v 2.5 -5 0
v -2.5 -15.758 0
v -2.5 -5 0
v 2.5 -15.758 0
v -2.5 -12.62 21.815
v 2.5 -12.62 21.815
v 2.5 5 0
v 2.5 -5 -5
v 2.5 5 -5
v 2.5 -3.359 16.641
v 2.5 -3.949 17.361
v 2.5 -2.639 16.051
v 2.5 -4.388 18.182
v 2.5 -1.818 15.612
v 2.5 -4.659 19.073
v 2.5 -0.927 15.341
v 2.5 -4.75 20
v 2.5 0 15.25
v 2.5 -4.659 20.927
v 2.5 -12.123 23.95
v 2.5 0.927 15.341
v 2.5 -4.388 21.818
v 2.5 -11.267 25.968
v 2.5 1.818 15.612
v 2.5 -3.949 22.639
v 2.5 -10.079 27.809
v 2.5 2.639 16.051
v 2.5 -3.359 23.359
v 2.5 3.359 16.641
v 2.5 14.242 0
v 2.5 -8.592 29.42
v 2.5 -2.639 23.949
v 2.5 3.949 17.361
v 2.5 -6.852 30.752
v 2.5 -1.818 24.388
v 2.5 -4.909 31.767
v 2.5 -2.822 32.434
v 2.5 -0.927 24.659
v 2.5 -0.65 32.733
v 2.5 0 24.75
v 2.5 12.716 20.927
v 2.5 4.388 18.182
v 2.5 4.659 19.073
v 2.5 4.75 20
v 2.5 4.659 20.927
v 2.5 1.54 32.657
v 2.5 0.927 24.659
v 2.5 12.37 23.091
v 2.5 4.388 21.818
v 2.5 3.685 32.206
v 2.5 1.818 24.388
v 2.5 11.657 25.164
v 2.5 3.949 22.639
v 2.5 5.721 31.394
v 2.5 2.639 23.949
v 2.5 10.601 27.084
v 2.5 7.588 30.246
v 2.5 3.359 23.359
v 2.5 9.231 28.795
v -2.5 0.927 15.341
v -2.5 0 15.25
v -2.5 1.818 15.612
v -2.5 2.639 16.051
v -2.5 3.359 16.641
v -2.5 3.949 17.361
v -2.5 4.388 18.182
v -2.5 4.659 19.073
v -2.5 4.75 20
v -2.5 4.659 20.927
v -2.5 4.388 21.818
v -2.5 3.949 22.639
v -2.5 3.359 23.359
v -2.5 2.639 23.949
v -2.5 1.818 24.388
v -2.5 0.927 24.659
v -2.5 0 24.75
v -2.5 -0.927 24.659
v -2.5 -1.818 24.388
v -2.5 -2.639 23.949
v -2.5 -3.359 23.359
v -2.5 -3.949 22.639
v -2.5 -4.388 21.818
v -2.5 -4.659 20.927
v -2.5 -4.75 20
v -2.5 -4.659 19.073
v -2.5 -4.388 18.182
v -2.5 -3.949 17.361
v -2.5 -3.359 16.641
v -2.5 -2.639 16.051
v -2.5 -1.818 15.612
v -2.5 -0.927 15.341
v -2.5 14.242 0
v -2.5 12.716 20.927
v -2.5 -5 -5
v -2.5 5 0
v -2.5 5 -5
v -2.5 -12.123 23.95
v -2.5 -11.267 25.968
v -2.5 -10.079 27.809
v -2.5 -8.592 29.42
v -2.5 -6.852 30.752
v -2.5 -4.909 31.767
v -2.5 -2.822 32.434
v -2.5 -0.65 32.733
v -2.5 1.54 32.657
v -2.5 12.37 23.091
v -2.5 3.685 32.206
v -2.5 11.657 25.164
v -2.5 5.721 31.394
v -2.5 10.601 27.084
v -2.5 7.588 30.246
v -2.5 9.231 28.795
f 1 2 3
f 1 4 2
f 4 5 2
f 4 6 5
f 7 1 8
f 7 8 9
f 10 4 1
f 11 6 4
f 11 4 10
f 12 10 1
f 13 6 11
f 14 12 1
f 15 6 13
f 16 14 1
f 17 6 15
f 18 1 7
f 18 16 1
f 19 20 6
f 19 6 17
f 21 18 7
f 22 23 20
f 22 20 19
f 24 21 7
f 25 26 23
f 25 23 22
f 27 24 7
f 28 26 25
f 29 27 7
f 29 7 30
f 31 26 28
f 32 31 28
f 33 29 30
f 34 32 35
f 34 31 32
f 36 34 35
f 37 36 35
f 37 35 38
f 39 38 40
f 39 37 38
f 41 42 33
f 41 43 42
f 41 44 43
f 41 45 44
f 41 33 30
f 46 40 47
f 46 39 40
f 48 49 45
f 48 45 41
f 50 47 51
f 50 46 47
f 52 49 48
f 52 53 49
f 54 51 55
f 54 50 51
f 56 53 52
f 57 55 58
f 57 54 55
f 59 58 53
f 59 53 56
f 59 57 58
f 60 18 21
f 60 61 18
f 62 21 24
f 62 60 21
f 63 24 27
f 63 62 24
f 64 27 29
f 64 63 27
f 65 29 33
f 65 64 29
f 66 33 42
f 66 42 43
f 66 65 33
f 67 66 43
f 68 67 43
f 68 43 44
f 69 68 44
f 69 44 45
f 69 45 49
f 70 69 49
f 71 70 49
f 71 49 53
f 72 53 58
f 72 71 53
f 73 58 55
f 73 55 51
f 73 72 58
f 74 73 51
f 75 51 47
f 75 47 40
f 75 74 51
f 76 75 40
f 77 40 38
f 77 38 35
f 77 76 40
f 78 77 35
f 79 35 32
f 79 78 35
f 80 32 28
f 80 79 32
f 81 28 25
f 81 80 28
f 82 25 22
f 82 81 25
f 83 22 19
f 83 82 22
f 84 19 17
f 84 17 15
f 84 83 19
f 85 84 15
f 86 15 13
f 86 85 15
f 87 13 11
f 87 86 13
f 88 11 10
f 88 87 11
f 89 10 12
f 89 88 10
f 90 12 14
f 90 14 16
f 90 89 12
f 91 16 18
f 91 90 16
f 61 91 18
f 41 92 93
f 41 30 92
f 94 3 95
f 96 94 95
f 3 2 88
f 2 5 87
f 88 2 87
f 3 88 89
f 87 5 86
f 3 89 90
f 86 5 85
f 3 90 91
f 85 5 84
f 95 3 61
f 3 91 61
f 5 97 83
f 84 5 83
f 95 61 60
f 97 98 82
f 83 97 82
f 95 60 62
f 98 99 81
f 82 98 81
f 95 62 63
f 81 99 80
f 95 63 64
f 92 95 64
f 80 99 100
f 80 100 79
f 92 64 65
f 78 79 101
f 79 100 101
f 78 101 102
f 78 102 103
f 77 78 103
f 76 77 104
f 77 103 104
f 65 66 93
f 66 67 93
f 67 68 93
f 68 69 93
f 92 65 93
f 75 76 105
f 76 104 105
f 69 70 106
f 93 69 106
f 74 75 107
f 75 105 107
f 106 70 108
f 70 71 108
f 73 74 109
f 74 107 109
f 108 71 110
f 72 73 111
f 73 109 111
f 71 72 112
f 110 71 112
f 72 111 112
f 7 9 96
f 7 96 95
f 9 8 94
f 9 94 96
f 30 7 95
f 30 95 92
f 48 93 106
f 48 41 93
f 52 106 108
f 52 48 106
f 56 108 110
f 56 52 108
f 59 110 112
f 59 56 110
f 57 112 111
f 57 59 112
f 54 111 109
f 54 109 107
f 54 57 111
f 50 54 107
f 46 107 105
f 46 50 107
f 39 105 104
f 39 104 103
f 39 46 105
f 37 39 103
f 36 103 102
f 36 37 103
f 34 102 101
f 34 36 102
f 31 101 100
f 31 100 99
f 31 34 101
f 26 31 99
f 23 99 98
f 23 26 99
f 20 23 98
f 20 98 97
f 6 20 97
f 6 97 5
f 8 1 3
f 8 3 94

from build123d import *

# Parameters (mm, degrees)
SKETCH1_R           = 4.75
BOSS_EXTRUDE1_DEPTH = 2.5


with BuildPart() as part:
    # Sketch1 → Boss-Extrude1 (new, symmetric)
    with BuildSketch(Plane.YZ):
        with BuildLine():
            Line((-15.757717512, 0), (-5, 0))
            Line((-5, 0), (-5, -5))
            Line((-5, -5), (5, -5))
            Line((5, -5), (5, 0))
            Line((5, 0), (14.242282488, 0))
            Line((14.242282488, 0), (12.716235334, 20.927285791))
            ThreePointArc((12.716235334, 20.927285791), (0.446501859, 32.742179409), (-12.620138577, 21.815103933))
            Line((-12.620138577, 21.815103933), (-15.757717512, 0))
        make_face()
        with Locations(Location((0, 20, 0), (0, 0, 270))):
            Circle(SKETCH1_R, mode=Mode.SUBTRACT)
    extrude(amount=BOSS_EXTRUDE1_DEPTH, both=True)


solid = part.part
